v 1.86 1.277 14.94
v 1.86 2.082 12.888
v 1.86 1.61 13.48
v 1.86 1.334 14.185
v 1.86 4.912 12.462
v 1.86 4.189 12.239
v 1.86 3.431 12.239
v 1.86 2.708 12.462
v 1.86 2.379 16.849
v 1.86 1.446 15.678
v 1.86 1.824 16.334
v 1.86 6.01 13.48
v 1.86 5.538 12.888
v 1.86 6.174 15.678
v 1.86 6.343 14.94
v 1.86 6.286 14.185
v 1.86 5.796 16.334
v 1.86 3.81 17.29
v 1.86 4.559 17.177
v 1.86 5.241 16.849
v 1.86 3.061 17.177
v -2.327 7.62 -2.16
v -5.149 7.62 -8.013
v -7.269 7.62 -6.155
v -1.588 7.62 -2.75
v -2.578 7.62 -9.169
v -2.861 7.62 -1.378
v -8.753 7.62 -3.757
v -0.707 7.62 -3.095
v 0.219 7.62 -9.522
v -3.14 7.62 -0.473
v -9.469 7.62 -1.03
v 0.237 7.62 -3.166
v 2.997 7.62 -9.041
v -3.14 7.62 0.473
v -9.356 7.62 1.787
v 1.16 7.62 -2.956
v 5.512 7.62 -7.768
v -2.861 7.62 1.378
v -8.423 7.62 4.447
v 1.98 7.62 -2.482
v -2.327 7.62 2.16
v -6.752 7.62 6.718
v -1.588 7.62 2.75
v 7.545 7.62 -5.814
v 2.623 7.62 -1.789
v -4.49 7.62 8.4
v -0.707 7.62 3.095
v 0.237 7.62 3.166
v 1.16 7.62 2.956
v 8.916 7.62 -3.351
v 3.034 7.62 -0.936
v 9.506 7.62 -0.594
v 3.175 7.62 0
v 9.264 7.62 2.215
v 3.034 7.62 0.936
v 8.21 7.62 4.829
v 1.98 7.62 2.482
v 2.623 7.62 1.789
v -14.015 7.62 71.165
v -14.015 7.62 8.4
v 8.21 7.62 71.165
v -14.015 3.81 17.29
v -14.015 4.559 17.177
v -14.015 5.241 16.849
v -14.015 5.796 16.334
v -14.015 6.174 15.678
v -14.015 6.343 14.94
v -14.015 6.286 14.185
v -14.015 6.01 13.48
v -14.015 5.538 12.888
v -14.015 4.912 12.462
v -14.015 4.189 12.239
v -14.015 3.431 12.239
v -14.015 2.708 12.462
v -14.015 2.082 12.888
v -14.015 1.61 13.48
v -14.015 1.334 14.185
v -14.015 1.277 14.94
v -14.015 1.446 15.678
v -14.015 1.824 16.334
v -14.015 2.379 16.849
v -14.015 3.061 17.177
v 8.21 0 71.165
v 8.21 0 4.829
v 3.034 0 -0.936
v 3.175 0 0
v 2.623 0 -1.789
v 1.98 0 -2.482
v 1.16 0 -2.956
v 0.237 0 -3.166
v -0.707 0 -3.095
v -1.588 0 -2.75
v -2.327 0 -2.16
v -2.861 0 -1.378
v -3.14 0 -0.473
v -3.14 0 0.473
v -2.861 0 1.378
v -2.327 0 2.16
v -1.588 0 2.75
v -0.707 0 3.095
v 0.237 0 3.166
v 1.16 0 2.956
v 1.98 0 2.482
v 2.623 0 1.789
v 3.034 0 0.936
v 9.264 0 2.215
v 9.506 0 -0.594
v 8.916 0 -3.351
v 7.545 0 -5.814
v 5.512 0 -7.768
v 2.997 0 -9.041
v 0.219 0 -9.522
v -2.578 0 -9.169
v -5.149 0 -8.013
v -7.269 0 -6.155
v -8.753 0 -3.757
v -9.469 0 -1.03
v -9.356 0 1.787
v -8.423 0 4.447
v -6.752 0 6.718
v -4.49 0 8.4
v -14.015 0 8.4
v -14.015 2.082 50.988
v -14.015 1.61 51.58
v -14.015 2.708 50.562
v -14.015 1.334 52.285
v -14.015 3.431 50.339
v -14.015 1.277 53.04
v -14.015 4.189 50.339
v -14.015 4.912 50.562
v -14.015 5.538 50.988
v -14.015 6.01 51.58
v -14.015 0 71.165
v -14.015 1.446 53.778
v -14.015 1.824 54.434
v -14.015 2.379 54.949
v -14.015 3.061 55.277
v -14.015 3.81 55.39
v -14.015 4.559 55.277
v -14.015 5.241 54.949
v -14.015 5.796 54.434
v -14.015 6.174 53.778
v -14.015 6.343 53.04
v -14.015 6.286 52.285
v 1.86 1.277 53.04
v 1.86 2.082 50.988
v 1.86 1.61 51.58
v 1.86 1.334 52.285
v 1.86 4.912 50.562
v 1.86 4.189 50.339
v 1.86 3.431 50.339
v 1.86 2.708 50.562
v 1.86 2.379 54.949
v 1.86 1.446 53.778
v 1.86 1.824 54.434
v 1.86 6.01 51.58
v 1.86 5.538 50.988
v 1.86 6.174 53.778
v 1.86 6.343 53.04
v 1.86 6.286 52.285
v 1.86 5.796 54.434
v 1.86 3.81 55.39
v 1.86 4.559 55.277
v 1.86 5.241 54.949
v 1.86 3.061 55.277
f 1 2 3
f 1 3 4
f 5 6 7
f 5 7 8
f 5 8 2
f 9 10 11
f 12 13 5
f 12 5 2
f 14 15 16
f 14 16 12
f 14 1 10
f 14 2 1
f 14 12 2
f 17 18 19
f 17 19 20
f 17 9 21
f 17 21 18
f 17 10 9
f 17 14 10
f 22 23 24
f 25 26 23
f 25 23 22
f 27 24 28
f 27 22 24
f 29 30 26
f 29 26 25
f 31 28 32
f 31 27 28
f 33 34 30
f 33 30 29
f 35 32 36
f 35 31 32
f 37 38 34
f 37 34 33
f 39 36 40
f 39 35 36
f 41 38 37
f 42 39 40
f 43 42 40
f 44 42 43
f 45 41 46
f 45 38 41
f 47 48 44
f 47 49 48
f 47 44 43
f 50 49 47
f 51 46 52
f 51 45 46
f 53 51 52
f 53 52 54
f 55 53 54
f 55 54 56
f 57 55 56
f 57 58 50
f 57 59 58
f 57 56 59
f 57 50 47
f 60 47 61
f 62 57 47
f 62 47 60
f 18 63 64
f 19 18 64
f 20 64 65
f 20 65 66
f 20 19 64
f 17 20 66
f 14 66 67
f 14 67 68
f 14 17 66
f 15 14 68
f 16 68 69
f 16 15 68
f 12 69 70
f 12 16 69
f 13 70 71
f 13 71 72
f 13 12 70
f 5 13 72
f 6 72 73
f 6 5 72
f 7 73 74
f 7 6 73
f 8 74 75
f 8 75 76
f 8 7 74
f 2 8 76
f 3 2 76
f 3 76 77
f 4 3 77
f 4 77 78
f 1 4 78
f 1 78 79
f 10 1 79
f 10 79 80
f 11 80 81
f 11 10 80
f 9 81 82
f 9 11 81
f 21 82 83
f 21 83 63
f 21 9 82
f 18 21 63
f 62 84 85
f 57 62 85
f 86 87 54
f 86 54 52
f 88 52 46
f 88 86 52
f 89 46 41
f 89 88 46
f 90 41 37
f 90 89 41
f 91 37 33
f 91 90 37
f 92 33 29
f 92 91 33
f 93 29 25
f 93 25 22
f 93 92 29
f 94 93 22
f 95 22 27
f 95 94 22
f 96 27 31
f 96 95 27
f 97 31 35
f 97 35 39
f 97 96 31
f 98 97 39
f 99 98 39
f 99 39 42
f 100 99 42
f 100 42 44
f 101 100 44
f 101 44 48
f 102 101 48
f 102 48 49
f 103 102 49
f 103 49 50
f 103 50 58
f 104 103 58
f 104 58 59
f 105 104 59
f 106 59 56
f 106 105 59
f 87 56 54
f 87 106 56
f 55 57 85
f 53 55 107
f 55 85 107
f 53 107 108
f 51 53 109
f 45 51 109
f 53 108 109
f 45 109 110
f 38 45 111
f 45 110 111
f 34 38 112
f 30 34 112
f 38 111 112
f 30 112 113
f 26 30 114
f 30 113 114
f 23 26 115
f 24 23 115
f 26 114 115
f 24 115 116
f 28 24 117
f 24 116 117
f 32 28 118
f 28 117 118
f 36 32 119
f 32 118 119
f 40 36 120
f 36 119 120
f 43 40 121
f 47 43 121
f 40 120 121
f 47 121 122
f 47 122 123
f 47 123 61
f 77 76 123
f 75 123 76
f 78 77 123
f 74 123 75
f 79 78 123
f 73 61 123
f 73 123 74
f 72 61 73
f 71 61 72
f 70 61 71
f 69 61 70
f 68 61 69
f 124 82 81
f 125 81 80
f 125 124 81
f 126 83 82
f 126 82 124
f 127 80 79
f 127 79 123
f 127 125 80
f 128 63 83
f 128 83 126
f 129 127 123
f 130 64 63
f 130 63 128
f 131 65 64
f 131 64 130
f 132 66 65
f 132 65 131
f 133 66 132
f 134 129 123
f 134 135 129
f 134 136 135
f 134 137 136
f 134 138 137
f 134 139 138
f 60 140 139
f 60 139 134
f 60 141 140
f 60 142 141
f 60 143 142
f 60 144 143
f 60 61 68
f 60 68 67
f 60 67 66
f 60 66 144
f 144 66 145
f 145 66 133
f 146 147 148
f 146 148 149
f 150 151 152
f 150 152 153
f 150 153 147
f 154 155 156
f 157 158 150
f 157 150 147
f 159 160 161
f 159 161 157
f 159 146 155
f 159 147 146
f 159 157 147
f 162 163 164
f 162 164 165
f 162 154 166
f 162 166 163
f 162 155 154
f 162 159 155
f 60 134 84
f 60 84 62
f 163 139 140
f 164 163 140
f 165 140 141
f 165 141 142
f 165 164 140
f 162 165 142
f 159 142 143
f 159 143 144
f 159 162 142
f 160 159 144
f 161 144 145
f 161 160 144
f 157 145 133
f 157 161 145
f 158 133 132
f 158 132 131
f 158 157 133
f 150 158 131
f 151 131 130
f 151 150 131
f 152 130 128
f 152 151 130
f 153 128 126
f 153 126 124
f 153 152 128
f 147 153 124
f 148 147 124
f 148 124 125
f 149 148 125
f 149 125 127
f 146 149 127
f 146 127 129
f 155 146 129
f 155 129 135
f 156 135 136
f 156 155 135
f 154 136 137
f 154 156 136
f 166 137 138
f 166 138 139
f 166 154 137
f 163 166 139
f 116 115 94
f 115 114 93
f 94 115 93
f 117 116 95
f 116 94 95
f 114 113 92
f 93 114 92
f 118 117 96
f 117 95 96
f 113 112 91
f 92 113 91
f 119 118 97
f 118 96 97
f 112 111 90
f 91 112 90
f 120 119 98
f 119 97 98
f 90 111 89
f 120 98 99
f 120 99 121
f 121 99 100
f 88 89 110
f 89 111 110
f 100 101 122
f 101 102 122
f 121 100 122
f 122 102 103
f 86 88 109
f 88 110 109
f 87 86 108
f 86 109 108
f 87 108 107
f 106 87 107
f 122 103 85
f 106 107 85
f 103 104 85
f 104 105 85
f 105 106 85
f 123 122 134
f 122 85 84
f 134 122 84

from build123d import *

# Parameters (mm, degrees)
SKETCH1_R           = 3.175
BOSS_EXTRUDE1_DEPTH = 7.62
SKETCH2_R           = 2.54
CUT_EXTRUDE1_DEPTH  = 6.35
SKETCH3_W           = 62.764867648
SKETCH3_H           = 7.62
SKETCH3_R           = 2.54
BOSS_EXTRUDE2_DEPTH = 9.525


with BuildPart() as part:
    # Sketch1 → Boss-Extrude1 (new body)
    with BuildSketch(Plane(origin=(0, 0, 0), x_dir=(1, 0, 0), z_dir=(0, 1, 0))):
        with BuildLine():
            Line((-4.490128061, -8.400260413), (-4.490128061, -71.165128061))
            Line((-4.490128061, -71.165128061), (8.209871939, -71.165128061))
            Line((8.209871939, -71.165128061), (8.209871939, -4.829454186))
            ThreePointArc((8.209871939, -4.829454186), (-2.578136518, 9.169451297), (-4.490128061, -8.400260413))
        make_face()
        Circle(SKETCH1_R, mode=Mode.SUBTRACT)
    extrude(amount=BOSS_EXTRUDE1_DEPTH)

    # Sketch2 → Cut-Extrude1 (cut)
    with BuildSketch(Plane.ZY.offset(4.490128061)):
        with Locations((14.750260413, 3.81)):
            Circle(SKETCH2_R)
        with Locations((52.850260413, 3.81)):
            Circle(SKETCH2_R)
    extrude(amount=-CUT_EXTRUDE1_DEPTH, mode=Mode.SUBTRACT)

    # Sketch3 → Boss-Extrude2 (add)
    with BuildSketch(Plane.ZY.offset(4.490128061)):
        with Locations((39.782694237, 3.81)):
            Rectangle(SKETCH3_W, SKETCH3_H)
        with Locations((52.850260413, 3.81)):
            Circle(SKETCH3_R, mode=Mode.SUBTRACT)
        with Locations((14.750260413, 3.81)):
            Circle(SKETCH3_R, mode=Mode.SUBTRACT)
    extrude(amount=BOSS_EXTRUDE2_DEPTH)


solid = part.part
